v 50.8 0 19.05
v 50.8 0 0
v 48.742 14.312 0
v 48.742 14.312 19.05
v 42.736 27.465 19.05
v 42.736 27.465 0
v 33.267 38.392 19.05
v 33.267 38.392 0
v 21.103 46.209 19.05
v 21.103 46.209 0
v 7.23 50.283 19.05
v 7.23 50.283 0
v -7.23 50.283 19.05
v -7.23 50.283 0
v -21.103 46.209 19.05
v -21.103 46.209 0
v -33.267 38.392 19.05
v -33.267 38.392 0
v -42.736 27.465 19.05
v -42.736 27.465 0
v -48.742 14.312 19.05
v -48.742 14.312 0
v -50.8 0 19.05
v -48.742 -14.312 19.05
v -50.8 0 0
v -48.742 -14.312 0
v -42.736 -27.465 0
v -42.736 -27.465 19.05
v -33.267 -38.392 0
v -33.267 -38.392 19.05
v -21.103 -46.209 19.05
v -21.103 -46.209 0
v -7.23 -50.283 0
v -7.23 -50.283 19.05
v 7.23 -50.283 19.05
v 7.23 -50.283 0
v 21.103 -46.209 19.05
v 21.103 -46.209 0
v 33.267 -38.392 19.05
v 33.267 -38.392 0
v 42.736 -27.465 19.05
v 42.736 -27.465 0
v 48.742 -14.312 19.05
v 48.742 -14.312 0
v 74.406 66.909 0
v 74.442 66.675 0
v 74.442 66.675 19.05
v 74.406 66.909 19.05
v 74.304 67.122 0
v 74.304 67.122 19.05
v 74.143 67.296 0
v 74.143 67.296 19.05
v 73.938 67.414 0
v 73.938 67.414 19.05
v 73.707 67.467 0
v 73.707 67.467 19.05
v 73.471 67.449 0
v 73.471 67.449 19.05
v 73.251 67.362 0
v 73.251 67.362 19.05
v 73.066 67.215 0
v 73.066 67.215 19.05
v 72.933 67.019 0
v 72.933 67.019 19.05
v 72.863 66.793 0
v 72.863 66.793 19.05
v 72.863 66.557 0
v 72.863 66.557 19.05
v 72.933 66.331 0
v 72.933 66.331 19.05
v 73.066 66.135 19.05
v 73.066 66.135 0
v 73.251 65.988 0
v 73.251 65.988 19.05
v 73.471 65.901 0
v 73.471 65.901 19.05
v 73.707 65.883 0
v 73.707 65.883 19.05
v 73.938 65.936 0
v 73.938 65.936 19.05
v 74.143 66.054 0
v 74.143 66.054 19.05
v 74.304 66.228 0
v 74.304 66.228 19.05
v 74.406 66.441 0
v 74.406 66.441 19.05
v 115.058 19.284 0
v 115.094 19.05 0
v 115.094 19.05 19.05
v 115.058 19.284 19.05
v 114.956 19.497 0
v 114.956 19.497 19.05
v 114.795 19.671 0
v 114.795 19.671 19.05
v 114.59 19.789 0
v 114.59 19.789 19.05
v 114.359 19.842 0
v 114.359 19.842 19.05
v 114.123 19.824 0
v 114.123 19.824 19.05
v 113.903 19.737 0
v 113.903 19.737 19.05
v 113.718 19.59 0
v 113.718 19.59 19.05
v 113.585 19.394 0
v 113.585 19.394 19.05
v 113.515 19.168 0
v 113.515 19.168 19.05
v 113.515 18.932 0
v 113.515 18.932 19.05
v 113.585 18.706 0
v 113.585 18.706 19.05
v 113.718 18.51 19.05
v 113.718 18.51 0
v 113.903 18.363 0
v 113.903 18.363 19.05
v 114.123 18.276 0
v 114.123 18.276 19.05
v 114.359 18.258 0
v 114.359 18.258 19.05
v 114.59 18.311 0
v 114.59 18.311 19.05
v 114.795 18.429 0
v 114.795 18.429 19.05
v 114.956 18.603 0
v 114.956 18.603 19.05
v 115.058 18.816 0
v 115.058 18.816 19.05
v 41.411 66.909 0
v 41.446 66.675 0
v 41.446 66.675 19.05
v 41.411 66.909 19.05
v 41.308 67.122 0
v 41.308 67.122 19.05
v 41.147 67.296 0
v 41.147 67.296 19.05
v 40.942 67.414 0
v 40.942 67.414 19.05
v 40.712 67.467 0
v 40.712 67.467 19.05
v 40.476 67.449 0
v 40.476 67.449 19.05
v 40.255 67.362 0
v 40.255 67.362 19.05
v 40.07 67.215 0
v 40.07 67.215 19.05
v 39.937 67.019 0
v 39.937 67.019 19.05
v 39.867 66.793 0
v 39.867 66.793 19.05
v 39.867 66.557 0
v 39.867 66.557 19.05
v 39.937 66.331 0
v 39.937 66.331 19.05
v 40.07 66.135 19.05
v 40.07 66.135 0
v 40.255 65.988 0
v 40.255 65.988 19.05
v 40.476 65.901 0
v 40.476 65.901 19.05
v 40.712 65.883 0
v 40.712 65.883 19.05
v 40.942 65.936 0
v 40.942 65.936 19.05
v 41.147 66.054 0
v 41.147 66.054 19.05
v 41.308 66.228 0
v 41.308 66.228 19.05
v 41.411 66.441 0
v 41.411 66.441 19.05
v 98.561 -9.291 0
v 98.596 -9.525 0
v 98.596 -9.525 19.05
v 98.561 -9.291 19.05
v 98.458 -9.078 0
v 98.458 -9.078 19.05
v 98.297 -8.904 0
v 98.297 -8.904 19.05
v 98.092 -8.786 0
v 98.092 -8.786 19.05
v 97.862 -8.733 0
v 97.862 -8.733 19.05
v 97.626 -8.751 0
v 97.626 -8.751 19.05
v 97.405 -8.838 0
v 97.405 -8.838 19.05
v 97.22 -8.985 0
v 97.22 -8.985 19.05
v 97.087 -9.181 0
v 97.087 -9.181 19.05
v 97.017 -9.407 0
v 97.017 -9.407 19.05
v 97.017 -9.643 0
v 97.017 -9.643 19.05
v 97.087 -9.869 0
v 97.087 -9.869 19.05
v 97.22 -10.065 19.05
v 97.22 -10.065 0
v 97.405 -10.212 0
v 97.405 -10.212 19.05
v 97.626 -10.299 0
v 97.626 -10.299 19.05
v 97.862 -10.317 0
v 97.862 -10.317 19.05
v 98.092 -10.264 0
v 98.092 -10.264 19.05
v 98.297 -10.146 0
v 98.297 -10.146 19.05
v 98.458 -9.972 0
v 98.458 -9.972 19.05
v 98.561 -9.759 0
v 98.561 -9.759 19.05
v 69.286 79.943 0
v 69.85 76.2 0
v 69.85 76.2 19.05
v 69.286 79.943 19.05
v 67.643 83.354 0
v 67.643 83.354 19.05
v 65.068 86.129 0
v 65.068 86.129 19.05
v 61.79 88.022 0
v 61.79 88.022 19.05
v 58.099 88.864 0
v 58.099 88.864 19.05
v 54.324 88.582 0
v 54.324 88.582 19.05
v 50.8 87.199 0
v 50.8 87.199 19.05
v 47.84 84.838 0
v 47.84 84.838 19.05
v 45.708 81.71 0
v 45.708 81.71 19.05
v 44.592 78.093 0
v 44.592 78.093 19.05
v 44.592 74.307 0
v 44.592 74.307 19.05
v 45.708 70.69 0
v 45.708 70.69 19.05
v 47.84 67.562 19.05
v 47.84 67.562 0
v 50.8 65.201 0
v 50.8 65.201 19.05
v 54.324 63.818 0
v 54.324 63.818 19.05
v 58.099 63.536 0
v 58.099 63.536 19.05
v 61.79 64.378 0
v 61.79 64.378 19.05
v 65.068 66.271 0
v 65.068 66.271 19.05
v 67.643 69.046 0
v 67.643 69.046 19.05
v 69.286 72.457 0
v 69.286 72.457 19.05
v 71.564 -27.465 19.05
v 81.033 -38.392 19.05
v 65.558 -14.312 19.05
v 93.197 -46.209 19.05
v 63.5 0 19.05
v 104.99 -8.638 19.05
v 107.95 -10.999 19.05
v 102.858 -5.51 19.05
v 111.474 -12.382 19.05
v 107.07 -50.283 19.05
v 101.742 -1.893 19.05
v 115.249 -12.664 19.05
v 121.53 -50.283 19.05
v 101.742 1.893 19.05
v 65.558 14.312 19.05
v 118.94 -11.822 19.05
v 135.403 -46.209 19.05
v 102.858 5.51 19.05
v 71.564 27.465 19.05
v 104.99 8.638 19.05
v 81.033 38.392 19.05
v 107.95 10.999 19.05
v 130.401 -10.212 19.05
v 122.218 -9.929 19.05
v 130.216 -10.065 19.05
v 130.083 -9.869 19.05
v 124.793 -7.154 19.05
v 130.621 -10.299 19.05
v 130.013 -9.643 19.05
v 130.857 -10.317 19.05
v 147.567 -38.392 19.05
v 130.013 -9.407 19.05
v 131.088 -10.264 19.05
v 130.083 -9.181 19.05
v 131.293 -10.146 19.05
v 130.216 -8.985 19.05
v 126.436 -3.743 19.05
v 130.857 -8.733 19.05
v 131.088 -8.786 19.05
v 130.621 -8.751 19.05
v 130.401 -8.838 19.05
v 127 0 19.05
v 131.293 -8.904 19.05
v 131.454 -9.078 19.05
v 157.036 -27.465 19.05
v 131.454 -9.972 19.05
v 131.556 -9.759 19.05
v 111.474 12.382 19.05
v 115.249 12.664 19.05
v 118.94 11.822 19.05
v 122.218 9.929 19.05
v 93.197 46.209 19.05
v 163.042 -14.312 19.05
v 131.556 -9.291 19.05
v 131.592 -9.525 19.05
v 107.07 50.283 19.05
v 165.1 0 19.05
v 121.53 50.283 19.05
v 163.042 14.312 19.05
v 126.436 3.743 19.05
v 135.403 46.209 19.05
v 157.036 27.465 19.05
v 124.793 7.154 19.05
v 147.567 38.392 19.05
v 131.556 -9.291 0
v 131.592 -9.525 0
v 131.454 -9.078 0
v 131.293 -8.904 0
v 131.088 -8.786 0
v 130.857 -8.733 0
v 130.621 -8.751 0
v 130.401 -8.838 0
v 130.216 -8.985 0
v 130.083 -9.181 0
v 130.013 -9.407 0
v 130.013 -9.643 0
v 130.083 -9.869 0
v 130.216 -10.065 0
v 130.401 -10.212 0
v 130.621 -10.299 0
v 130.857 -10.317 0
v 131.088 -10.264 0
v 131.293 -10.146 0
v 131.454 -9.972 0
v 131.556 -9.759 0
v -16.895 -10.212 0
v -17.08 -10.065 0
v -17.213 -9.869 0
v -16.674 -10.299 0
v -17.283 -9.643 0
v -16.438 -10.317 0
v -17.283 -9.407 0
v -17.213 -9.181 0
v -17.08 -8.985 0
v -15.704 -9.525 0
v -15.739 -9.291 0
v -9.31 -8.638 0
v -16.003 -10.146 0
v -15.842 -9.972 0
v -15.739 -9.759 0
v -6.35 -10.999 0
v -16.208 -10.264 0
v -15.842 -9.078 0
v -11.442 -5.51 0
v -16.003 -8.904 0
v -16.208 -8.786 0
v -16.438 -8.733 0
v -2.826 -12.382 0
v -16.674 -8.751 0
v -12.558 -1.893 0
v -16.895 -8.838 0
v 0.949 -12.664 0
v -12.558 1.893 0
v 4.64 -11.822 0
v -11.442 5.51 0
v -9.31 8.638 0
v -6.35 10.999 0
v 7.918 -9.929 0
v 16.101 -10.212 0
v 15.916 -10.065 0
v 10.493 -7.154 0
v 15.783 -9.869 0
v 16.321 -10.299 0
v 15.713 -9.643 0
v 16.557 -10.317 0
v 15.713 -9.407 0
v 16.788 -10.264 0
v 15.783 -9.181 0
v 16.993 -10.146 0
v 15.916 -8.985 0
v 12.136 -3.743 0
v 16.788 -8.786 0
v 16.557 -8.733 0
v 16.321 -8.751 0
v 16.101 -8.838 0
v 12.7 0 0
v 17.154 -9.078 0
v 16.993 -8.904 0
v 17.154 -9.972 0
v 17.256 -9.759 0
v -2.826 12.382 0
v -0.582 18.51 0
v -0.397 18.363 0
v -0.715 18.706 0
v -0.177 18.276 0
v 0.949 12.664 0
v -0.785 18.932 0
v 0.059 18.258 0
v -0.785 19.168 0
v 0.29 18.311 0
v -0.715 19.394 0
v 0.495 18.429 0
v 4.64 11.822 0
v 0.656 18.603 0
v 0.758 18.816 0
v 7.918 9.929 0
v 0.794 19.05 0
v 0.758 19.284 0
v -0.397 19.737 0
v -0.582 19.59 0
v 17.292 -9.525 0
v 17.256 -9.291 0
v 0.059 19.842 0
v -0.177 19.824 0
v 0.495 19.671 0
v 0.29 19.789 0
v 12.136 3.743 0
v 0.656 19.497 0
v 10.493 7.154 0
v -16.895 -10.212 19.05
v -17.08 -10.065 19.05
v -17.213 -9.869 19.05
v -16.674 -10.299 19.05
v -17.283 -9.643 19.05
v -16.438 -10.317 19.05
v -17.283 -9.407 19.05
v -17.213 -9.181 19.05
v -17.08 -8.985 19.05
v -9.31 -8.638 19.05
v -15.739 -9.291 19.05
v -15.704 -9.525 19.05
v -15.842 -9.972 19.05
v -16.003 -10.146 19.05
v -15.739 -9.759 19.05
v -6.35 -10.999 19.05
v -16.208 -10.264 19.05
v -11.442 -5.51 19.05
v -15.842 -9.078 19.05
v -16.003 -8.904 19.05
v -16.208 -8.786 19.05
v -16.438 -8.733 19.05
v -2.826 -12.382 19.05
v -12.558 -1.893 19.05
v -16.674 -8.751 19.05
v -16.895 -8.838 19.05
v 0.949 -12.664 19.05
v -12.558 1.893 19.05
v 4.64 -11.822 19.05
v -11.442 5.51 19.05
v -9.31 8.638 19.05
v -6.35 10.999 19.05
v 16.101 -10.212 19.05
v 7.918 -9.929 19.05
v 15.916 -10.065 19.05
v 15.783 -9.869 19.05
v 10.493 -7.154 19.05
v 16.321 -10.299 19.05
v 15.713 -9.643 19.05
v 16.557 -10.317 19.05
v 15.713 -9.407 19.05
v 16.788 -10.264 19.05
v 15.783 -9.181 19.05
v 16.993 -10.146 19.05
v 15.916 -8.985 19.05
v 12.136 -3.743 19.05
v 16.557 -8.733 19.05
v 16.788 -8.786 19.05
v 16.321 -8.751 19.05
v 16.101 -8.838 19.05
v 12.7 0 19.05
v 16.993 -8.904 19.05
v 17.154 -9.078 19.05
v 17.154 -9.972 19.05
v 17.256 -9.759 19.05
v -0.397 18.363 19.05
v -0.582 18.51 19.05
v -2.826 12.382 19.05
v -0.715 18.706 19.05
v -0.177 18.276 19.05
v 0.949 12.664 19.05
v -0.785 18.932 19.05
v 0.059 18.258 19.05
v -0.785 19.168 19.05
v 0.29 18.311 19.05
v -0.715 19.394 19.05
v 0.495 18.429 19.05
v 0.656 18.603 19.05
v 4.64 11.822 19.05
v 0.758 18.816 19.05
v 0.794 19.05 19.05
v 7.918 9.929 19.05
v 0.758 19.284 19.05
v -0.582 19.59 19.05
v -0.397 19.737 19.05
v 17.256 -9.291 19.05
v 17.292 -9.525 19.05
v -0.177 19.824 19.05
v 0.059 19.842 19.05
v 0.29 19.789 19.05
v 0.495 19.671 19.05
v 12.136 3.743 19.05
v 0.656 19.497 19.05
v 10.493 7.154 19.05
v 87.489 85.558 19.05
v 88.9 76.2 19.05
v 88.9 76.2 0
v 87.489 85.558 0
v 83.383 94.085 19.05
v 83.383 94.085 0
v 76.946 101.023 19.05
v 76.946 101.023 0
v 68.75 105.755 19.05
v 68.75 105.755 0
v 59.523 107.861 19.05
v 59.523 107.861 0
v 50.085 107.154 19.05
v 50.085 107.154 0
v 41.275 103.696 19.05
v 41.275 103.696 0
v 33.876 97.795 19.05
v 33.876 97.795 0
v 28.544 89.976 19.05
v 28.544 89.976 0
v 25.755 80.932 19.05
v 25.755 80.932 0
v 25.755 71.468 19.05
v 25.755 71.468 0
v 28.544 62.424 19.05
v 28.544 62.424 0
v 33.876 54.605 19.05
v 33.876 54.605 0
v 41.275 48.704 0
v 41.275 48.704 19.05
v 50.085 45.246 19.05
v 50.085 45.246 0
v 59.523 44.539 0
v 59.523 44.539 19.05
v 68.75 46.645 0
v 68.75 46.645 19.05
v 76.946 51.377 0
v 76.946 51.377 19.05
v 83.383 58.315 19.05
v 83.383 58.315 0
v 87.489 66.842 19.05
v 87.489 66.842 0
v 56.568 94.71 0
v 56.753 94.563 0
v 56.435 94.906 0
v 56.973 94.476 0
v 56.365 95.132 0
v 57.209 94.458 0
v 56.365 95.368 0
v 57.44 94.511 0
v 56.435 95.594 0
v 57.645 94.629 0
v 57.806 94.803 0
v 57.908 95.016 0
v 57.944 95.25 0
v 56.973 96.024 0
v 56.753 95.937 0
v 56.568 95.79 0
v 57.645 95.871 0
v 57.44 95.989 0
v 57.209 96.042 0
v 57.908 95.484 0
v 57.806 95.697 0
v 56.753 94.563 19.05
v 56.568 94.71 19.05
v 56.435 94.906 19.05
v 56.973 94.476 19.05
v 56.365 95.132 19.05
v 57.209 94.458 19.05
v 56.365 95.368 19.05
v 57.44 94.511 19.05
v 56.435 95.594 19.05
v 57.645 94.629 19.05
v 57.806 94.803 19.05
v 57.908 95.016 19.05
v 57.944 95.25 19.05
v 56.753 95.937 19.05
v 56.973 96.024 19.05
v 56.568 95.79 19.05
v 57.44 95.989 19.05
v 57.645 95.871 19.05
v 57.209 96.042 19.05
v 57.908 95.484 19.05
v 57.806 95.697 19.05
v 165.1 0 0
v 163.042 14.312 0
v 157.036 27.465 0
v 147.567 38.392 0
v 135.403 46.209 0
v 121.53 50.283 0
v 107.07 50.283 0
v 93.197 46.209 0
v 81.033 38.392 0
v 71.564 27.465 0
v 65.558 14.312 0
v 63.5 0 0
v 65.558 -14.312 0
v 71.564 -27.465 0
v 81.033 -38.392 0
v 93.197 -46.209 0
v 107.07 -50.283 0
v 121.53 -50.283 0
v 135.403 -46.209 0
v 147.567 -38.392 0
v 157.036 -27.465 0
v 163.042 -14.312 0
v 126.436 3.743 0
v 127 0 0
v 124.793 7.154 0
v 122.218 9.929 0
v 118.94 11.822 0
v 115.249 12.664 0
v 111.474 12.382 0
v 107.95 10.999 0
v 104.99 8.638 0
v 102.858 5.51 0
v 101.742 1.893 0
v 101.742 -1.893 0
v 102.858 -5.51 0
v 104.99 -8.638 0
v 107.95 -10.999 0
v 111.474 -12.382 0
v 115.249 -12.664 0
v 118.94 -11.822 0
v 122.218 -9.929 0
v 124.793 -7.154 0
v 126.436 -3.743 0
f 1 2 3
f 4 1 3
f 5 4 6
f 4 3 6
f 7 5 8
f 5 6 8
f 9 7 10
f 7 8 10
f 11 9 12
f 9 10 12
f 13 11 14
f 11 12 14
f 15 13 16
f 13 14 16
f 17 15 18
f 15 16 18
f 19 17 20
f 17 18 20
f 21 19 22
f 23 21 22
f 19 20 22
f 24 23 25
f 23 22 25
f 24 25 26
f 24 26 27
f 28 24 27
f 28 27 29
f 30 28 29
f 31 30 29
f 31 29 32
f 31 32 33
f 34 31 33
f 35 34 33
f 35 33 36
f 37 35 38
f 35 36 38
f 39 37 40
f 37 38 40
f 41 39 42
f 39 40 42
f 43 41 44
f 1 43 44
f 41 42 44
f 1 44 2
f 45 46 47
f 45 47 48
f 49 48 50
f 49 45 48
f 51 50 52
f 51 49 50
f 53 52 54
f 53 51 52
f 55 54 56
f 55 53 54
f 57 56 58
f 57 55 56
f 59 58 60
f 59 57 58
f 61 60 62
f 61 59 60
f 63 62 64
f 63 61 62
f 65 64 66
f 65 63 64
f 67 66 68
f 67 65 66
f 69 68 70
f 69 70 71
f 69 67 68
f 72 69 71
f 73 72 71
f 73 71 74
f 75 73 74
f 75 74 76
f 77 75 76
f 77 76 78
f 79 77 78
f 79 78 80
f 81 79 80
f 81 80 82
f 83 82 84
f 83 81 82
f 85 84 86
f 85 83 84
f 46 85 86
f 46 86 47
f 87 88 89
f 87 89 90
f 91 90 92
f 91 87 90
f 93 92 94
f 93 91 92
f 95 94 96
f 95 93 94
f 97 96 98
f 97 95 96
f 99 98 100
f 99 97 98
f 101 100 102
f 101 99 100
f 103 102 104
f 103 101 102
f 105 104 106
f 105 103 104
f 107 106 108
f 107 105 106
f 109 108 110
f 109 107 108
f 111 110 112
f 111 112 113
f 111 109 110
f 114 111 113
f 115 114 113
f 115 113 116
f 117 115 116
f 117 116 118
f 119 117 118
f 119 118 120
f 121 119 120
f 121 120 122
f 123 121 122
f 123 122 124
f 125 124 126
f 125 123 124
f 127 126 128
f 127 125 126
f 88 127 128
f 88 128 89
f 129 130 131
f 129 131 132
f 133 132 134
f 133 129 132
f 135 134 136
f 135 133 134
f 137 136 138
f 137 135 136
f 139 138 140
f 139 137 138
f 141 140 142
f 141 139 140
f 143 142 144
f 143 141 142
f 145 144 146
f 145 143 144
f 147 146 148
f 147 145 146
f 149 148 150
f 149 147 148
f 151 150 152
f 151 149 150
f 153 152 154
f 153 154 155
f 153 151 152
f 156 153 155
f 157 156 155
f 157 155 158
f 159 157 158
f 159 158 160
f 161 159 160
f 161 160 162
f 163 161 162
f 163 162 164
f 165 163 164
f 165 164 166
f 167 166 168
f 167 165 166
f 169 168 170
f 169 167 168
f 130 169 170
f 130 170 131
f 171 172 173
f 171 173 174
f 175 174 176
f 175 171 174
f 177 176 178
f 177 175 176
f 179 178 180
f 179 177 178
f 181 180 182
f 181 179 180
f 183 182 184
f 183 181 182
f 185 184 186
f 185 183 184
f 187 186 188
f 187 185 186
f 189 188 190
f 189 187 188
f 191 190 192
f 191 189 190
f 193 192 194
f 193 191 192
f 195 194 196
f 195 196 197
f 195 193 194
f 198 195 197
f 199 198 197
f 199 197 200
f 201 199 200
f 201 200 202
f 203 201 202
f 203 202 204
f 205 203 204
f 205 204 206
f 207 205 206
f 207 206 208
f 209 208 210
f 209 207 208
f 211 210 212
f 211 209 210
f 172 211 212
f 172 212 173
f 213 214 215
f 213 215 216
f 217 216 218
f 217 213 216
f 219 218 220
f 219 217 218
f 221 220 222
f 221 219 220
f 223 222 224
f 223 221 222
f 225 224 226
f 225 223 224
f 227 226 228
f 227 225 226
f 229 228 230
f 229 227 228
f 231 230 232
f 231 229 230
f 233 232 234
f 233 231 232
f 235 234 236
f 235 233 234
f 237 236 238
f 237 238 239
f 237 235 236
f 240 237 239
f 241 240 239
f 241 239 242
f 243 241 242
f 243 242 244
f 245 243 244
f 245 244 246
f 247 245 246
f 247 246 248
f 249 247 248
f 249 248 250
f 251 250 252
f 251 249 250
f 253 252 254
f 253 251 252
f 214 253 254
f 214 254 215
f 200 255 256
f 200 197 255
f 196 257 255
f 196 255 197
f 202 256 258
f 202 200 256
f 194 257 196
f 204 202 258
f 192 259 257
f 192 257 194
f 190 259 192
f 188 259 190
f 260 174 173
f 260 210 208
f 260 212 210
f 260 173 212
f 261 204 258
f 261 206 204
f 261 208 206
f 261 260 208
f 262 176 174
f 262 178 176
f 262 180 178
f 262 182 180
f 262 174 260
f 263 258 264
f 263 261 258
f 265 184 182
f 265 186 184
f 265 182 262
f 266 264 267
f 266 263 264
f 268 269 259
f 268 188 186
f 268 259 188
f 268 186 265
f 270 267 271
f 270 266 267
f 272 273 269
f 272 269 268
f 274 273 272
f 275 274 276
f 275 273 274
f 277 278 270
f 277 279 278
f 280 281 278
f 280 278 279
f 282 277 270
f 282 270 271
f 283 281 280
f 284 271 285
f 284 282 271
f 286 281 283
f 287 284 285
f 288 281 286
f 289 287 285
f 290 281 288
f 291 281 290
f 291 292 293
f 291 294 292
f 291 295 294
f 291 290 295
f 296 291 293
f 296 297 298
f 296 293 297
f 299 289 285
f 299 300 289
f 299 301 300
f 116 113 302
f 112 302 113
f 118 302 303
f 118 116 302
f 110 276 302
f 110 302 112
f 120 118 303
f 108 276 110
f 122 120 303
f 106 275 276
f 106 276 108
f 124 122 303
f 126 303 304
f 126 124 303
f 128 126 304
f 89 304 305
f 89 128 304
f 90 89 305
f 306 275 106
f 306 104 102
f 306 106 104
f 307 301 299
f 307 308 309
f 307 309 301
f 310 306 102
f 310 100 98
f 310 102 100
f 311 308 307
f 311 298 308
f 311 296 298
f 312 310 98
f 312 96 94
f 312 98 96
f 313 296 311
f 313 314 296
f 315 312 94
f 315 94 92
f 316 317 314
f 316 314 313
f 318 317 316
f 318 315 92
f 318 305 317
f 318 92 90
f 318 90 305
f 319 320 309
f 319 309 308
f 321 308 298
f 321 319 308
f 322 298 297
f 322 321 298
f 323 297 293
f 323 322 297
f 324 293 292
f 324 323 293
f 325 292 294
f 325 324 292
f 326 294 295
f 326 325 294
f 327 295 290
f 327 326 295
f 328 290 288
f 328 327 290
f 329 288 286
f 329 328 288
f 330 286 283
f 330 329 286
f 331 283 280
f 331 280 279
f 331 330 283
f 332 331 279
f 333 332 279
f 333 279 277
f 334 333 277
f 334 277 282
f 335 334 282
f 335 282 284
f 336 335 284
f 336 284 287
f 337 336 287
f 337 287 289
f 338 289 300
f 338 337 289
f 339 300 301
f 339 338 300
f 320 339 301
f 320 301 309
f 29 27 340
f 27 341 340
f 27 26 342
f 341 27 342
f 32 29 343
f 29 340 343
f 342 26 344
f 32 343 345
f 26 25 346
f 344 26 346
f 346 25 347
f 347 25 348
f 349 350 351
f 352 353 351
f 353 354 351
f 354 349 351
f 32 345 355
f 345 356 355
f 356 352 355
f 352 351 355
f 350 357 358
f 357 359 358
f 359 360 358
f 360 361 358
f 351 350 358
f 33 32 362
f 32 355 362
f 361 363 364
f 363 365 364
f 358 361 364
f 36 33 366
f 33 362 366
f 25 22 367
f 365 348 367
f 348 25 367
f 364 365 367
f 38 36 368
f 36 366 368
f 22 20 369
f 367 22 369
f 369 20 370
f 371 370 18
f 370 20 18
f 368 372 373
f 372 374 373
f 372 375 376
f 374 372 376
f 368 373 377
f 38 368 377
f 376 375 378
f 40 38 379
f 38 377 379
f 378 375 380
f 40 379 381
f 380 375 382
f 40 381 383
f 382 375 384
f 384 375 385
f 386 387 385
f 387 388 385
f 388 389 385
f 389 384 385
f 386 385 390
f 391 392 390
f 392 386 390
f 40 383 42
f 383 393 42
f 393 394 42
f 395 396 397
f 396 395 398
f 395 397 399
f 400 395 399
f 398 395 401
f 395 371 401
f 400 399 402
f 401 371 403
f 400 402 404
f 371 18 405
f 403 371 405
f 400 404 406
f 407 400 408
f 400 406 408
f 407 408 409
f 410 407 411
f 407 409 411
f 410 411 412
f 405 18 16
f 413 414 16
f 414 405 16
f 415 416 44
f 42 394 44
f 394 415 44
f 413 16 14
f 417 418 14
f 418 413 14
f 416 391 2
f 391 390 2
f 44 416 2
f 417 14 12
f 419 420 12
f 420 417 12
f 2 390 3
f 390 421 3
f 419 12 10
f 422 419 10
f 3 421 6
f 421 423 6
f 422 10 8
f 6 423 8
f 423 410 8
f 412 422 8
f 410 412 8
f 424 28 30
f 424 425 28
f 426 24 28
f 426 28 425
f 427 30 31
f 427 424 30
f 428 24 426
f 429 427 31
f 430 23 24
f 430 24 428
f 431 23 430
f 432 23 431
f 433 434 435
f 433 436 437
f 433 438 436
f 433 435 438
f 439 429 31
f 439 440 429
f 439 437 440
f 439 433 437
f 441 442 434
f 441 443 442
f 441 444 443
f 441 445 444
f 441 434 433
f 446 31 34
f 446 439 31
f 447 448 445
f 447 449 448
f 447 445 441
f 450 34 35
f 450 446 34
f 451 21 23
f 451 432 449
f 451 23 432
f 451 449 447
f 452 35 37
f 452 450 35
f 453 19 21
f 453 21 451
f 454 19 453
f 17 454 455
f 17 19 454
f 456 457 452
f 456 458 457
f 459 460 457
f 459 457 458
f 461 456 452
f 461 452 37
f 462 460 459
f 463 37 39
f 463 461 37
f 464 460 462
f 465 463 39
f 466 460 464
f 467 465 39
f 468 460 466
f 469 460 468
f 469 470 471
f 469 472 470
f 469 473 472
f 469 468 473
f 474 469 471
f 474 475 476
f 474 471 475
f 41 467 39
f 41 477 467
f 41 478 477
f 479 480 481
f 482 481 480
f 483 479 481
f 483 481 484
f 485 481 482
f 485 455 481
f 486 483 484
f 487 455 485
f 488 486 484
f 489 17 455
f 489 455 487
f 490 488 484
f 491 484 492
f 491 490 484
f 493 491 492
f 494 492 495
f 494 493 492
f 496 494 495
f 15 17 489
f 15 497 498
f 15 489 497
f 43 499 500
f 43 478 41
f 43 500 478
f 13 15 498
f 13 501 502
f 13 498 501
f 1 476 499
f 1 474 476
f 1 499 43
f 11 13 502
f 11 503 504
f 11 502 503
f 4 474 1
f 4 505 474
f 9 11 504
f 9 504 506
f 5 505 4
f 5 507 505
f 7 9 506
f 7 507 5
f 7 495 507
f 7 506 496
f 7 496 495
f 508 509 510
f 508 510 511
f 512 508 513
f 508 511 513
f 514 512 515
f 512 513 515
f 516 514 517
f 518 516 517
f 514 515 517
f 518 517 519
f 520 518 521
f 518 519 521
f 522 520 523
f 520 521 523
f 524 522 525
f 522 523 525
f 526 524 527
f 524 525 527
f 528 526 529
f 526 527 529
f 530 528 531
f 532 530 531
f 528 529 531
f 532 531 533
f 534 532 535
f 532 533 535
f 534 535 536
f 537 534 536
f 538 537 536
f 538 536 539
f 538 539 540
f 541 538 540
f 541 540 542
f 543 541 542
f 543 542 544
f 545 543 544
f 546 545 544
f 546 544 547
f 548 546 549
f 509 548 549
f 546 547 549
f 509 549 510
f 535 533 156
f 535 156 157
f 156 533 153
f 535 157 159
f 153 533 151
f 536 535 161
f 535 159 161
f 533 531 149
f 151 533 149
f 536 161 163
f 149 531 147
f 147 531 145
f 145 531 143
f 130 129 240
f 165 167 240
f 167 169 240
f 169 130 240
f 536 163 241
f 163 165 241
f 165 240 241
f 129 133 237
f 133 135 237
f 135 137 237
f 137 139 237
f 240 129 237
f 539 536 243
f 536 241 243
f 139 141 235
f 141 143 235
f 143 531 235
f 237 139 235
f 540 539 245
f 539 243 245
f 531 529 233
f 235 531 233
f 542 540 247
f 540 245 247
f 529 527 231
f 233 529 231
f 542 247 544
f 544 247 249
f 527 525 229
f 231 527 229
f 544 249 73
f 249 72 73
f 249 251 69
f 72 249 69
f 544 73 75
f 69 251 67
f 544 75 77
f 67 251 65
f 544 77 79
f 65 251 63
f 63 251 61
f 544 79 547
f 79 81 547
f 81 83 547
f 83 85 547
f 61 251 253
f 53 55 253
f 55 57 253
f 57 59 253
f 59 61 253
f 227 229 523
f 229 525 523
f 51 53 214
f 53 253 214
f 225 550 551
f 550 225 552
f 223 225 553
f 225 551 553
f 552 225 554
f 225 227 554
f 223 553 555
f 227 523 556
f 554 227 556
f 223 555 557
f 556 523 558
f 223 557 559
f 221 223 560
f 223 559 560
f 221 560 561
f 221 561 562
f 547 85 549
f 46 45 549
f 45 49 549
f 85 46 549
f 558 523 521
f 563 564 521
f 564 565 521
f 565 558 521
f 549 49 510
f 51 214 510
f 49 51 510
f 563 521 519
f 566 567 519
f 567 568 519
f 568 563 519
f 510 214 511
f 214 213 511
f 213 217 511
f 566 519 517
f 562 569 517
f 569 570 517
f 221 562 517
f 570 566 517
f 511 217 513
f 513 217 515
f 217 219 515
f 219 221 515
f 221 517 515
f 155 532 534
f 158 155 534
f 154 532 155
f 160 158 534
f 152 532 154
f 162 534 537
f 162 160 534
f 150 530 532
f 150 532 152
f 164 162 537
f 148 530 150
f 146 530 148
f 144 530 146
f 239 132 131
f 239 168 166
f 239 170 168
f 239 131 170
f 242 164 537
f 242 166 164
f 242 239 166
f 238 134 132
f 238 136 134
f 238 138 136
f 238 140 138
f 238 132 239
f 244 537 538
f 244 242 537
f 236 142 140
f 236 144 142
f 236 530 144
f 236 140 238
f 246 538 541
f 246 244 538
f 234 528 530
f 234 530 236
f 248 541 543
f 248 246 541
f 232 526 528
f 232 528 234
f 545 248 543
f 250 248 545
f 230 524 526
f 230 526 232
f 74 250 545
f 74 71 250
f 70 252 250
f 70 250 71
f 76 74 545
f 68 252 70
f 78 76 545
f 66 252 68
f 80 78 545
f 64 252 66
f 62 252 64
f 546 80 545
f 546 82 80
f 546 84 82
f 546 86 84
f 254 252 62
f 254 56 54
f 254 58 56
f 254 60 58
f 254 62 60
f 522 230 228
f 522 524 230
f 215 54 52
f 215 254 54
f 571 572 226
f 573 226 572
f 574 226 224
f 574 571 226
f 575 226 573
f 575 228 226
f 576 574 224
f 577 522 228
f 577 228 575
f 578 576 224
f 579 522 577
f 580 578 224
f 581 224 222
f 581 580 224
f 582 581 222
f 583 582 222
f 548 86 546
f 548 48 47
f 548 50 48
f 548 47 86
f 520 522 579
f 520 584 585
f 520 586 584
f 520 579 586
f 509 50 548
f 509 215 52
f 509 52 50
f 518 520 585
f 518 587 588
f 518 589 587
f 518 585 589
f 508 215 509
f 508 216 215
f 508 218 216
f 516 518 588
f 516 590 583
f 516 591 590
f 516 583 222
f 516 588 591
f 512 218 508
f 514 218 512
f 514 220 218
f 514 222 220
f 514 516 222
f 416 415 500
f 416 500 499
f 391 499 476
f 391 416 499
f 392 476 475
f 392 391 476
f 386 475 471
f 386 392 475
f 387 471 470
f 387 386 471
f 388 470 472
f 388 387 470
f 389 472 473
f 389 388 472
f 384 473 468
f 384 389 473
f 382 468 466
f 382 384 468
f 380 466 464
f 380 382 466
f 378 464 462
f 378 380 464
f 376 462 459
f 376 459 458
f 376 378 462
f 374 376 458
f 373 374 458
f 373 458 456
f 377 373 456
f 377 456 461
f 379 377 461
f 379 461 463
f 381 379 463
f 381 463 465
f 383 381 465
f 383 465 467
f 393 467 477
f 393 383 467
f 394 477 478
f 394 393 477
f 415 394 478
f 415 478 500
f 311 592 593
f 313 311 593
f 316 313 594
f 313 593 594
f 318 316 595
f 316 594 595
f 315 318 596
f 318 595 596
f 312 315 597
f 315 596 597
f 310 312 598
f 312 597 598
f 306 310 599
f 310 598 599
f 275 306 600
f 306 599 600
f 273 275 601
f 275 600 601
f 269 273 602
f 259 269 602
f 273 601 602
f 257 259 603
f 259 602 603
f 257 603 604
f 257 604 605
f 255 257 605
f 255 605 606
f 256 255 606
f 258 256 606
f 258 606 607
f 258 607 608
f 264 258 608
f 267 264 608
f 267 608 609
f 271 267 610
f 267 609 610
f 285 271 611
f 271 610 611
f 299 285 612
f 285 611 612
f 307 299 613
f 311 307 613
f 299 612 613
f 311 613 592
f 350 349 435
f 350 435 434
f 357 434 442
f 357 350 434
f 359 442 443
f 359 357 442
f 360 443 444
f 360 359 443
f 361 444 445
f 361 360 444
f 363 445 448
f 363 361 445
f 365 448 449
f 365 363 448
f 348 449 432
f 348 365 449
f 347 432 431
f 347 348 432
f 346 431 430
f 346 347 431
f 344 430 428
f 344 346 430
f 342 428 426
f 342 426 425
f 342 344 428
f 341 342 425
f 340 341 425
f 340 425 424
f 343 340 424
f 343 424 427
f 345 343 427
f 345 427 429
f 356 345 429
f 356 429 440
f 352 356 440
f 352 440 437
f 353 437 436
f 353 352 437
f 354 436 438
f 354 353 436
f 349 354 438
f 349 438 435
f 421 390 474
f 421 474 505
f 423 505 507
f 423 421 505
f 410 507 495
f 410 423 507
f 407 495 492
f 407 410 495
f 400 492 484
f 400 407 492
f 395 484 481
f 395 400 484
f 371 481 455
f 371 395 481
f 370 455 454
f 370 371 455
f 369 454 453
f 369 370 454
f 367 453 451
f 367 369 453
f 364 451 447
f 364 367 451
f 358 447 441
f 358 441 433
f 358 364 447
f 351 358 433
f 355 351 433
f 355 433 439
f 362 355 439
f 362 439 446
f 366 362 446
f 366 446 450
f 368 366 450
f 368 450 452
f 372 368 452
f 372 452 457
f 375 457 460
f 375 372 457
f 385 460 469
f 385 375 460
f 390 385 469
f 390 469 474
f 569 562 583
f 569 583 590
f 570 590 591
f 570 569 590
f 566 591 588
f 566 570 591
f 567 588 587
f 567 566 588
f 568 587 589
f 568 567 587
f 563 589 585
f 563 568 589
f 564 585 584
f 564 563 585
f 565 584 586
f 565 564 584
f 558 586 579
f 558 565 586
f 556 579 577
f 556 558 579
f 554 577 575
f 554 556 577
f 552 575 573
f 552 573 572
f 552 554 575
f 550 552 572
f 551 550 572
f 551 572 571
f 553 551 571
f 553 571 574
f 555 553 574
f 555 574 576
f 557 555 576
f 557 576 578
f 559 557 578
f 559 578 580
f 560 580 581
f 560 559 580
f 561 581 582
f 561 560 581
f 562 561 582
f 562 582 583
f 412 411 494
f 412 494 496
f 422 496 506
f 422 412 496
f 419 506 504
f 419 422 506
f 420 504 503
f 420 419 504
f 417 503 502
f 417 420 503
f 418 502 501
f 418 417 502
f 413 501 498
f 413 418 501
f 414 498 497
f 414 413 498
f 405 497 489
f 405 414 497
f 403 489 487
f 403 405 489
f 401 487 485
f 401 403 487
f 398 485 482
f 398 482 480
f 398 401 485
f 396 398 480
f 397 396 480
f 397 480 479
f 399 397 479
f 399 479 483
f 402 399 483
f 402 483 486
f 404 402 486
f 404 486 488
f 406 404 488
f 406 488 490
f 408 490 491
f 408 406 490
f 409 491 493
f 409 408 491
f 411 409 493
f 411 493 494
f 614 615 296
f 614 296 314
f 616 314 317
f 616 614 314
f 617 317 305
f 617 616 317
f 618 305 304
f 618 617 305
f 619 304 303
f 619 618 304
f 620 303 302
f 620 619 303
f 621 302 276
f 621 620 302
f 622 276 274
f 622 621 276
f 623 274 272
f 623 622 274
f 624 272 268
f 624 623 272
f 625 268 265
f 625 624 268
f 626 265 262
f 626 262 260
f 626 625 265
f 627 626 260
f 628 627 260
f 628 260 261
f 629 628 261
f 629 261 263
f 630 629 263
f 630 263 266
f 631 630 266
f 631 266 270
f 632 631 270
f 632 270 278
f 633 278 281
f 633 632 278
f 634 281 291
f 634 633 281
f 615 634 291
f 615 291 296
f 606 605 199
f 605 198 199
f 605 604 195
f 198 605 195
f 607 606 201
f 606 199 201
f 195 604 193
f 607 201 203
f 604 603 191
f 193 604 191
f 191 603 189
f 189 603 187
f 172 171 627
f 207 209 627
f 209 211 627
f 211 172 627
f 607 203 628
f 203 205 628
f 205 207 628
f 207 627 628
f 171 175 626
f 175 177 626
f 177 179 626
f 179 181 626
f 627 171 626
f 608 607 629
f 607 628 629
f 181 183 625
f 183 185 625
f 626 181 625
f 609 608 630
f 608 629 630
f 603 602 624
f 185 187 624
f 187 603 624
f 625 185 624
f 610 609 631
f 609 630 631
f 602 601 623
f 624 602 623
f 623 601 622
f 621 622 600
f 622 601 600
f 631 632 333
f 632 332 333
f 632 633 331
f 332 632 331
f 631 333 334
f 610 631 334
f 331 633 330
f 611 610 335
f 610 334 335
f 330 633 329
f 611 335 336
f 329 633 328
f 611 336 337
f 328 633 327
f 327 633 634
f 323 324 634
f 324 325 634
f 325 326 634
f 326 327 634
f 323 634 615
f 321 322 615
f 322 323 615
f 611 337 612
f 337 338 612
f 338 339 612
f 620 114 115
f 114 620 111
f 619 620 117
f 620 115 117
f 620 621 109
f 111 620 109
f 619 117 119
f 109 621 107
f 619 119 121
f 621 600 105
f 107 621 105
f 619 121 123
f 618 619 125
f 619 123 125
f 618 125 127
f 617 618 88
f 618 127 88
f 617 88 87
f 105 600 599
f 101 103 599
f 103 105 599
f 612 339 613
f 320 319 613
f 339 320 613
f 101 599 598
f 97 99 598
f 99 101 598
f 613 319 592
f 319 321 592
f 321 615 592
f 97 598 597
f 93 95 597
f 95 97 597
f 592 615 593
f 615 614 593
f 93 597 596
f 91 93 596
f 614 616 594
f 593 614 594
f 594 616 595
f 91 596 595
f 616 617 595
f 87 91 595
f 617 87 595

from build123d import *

# Parameters (mm, degrees)
F0_R     = 50.8
F0_R_2   = 0.79375
F0_R_3   = 12.7
F0_R_4   = 31.75
F1_DEPTH = 19.05


with BuildPart() as f1:
    # F0 (on Top) → F1 (new body)
    with BuildSketch(Plane.XY):
        Circle(F0_R)
        with Locations((-16.497784, -9.525)):
            Circle(F0_R_2, mode=Mode.SUBTRACT)
        Circle(F0_R_3, mode=Mode.SUBTRACT)
        with Locations((0, 19.05)):
            Circle(F0_R_2, mode=Mode.SUBTRACT)
        with Locations((16.497784, -9.525)):
            Circle(F0_R_2, mode=Mode.SUBTRACT)
        with Locations((114.3, 0)):
            Circle(F0_R)
        with Locations((97.802216, -9.525)):
            Circle(F0_R_2, mode=Mode.SUBTRACT)
        with Locations((130.797784, -9.525)):
            Circle(F0_R_2, mode=Mode.SUBTRACT)
        with Locations((114.3, 0)):
            Circle(F0_R_3, mode=Mode.SUBTRACT)
        with Locations((114.3, 19.05)):
            Circle(F0_R_2, mode=Mode.SUBTRACT)
        with Locations((57.15, 76.2)):
            Circle(F0_R_4)
        with Locations((40.652216, 66.675)):
            Circle(F0_R_2, mode=Mode.SUBTRACT)
        with Locations((73.647784, 66.675)):
            Circle(F0_R_2, mode=Mode.SUBTRACT)
        with Locations((57.15, 76.2)):
            Circle(F0_R_3, mode=Mode.SUBTRACT)
        with Locations((57.15, 95.25)):
            Circle(F0_R_2, mode=Mode.SUBTRACT)
    extrude(amount=F1_DEPTH)


solid = f1.part
